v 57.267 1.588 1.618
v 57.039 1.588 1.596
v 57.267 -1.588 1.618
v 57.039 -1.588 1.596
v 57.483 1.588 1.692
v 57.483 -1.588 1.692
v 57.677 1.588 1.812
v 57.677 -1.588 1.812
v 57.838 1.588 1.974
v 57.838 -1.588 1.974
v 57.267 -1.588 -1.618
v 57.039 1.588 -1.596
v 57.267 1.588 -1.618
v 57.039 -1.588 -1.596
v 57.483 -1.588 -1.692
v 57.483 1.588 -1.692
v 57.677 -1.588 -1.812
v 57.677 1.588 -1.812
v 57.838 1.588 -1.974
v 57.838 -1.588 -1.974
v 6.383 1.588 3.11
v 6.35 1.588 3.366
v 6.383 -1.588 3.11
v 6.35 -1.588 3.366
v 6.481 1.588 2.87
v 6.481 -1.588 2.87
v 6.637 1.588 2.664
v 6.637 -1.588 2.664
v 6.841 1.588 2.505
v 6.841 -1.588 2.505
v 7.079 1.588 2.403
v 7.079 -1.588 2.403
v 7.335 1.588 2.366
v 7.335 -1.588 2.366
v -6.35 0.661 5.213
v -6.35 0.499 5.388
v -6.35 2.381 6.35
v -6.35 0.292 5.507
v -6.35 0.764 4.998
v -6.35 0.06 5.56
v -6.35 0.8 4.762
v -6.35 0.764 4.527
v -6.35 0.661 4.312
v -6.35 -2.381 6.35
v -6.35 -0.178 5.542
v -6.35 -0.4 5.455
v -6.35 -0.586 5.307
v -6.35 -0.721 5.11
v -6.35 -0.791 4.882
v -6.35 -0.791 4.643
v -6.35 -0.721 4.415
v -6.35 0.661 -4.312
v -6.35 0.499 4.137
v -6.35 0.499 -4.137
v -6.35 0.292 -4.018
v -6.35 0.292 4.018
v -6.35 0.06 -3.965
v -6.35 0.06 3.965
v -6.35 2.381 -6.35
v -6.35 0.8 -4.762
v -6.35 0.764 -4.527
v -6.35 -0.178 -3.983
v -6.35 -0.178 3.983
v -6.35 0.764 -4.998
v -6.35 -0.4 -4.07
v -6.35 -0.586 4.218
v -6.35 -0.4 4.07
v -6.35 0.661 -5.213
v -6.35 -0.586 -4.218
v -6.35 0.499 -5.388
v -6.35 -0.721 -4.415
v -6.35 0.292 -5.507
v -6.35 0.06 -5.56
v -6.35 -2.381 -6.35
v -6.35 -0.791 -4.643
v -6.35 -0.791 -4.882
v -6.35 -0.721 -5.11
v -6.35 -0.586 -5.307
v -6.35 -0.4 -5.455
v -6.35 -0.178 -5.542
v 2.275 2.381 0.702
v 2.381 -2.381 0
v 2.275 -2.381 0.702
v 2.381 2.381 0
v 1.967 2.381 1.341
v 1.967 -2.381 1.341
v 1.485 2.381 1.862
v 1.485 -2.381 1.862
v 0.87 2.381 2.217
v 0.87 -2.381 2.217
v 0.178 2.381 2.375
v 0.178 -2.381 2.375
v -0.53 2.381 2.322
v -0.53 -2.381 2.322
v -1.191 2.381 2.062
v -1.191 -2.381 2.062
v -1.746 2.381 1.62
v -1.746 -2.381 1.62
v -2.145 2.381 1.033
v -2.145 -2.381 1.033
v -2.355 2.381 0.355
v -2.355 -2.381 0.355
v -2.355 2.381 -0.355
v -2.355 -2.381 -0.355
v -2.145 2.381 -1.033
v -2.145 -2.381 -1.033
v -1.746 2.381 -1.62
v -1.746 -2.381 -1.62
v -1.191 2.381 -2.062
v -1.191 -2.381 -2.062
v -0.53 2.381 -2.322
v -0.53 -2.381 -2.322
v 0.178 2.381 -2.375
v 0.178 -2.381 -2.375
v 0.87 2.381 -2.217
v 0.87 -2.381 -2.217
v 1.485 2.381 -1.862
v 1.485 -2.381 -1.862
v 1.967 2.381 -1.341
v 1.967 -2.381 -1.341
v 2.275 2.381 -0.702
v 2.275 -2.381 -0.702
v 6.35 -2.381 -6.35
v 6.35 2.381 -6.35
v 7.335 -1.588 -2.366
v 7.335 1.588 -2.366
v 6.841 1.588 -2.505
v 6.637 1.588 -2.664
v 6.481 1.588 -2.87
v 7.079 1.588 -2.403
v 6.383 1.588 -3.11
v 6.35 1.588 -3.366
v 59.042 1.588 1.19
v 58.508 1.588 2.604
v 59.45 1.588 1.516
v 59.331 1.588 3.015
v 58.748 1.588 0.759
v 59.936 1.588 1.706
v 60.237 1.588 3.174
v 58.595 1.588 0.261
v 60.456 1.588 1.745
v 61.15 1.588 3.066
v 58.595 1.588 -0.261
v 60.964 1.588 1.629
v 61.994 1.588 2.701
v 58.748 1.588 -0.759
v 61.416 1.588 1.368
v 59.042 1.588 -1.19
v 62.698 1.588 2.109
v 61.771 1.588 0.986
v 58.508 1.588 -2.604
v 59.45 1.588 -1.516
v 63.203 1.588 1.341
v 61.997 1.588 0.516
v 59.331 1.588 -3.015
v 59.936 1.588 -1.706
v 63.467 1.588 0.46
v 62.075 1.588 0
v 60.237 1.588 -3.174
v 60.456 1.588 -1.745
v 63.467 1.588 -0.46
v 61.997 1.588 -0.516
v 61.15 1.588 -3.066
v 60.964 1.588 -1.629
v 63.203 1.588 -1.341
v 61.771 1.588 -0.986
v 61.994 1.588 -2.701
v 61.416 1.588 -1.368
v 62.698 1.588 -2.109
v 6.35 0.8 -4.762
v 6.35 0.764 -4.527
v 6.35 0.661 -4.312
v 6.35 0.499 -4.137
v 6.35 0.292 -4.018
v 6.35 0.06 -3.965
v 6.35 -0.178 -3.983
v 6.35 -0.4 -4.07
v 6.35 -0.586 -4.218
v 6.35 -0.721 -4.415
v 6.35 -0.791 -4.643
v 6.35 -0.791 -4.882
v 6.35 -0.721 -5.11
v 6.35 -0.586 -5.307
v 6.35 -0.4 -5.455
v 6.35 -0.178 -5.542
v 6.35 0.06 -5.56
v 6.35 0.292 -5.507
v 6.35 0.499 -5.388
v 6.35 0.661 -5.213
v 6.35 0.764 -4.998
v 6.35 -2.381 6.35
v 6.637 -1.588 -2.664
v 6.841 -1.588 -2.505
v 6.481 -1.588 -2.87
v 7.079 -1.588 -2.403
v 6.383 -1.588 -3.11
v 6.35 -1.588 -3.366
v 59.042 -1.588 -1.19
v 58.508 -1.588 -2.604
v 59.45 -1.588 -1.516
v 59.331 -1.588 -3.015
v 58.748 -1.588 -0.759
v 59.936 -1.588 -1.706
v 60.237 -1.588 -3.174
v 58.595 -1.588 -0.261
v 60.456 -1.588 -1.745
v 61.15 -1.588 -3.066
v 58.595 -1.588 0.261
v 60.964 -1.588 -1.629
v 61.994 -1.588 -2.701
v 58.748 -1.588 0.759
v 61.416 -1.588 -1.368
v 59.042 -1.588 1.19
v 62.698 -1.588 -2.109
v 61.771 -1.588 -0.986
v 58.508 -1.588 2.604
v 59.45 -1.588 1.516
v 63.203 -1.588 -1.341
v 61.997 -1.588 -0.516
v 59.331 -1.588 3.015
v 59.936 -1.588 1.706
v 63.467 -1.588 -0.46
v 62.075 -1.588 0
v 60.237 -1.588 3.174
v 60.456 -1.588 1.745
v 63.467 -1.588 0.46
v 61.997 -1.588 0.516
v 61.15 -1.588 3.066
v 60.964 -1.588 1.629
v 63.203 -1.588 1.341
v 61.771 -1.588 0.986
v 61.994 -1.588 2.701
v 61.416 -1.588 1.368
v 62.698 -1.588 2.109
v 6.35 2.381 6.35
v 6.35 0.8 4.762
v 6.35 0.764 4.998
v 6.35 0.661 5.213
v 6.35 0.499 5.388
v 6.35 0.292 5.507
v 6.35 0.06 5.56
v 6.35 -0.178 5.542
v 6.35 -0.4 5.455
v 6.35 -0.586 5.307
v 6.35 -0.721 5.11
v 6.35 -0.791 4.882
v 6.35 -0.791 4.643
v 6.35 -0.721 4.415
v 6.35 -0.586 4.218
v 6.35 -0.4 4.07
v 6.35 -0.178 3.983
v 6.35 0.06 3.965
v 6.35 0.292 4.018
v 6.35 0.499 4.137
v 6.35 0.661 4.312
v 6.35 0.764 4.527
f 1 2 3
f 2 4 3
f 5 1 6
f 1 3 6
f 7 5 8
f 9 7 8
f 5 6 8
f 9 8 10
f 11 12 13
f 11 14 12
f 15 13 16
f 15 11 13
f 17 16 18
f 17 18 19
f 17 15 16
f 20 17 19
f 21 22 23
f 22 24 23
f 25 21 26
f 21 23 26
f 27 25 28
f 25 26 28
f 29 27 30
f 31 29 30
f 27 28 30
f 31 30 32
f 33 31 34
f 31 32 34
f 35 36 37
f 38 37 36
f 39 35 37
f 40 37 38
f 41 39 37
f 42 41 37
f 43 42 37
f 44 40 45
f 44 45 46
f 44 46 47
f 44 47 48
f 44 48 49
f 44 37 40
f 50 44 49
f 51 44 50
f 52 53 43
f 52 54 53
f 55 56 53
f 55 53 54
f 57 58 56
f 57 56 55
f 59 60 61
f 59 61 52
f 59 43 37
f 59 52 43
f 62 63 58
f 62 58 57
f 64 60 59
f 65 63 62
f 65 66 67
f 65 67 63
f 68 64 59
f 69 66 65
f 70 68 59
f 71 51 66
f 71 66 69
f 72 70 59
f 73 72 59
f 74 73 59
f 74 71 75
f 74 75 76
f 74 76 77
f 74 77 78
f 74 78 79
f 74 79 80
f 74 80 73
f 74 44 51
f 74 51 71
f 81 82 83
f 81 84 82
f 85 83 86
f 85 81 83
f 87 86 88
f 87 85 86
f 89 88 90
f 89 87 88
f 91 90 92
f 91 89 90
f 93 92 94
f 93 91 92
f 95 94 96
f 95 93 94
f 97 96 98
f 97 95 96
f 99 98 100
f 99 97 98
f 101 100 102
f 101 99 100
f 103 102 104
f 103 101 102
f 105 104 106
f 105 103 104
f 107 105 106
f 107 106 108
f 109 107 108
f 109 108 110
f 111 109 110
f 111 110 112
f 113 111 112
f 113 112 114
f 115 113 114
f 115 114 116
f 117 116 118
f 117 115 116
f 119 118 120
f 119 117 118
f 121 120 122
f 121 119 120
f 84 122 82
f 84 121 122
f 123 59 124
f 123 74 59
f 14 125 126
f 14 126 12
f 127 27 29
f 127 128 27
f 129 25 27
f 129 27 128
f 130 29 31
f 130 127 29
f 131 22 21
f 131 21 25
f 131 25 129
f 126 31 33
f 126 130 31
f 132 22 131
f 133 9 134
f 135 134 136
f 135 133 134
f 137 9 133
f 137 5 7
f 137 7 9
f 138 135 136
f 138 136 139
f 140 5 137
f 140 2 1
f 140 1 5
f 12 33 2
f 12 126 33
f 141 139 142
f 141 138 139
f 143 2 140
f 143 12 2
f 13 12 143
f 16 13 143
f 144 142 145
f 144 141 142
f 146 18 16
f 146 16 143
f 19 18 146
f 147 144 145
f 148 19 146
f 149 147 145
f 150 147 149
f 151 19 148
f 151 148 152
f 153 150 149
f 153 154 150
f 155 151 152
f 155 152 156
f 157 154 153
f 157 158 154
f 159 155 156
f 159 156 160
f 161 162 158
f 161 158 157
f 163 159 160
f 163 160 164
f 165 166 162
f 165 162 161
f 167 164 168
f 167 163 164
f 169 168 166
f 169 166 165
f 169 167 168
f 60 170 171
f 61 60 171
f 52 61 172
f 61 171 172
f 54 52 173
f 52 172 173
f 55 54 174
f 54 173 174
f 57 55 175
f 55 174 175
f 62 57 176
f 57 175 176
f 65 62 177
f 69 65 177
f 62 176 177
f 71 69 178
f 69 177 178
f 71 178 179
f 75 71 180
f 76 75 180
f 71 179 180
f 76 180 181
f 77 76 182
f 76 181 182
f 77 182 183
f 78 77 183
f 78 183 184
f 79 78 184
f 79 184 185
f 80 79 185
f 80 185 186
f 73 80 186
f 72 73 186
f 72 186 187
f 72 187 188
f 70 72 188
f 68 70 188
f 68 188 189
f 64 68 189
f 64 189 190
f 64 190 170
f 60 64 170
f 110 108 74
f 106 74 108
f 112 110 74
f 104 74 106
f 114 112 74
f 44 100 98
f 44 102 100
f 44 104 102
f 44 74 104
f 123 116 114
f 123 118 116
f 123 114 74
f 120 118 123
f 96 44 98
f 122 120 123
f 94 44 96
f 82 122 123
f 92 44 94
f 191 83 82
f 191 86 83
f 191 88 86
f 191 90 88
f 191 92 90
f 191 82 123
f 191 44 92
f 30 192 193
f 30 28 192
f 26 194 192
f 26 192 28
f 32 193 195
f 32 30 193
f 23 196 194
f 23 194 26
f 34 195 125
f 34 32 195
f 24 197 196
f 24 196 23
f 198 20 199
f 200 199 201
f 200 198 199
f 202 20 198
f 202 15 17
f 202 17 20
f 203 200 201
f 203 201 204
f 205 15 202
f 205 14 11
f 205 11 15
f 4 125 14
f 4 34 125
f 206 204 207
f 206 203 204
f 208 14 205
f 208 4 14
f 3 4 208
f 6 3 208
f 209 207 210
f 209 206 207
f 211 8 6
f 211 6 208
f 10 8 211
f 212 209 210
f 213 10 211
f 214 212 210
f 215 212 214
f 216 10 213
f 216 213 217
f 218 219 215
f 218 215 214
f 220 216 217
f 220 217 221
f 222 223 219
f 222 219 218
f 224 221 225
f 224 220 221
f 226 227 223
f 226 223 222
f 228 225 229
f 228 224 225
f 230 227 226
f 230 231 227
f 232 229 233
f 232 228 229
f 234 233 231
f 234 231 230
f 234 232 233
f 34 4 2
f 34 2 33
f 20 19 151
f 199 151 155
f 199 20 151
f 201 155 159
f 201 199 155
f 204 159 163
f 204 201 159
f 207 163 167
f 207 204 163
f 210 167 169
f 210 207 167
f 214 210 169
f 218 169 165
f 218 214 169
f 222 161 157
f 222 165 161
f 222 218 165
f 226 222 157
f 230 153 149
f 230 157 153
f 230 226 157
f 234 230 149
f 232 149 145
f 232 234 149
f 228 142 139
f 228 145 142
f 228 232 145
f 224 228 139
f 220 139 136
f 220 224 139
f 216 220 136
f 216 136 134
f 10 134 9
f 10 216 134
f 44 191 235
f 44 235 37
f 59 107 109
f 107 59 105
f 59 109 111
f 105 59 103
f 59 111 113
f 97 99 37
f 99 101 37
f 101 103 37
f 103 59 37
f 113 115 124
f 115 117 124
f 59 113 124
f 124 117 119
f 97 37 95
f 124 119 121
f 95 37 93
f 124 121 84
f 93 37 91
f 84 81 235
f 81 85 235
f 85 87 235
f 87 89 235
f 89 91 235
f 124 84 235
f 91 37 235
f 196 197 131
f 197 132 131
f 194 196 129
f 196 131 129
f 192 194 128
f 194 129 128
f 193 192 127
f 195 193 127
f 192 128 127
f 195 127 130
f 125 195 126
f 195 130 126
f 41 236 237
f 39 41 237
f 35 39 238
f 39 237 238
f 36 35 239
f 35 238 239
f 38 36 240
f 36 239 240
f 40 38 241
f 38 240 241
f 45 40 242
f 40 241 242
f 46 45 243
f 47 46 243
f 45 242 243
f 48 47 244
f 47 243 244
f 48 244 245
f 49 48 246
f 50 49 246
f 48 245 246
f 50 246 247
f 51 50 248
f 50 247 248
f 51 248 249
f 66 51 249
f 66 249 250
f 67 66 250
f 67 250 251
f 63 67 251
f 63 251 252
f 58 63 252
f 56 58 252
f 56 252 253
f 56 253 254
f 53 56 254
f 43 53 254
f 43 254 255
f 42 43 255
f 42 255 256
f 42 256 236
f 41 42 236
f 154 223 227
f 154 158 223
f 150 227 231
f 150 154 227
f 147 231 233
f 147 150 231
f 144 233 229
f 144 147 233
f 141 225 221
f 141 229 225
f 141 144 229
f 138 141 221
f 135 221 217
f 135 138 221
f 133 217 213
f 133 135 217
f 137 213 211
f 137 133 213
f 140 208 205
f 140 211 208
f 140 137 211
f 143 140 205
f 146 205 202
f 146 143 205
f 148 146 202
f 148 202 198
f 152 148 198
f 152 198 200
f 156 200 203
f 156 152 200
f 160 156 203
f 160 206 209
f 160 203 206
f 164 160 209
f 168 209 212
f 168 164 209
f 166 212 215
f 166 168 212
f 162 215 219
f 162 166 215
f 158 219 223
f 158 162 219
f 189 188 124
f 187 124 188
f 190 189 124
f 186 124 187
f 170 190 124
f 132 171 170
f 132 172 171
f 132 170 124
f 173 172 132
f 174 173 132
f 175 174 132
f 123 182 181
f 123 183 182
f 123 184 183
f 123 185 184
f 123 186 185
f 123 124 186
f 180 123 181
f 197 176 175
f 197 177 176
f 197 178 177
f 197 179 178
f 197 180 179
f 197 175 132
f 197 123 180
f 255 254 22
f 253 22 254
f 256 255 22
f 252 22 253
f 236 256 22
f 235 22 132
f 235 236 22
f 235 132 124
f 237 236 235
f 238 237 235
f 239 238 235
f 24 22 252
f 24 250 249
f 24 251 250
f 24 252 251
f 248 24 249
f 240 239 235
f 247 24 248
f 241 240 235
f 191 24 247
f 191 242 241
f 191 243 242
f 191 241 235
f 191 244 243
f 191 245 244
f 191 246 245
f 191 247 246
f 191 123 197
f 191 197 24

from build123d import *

# Parameters (mm, degrees)
F0_R     = 2.38125
F0_R_2   = 1.75
F1_DEPTH = 2.38125
F2_W     = 57.15
F2_H     = 0.79375
F3_DEPTH = 12.5
F5_D     = 1.6
F6_R     = 1


with BuildPart() as f1:
    # F0 (on Front) → F1 (new body, symmetric)
    with BuildSketch(Plane.XZ):
        with BuildLine():
            Line((6.35, -2.38125), (57.575369343, -1.5875))
            ThreePointArc((57.575369343, -1.5875), (63.5, 0), (57.575369343, 1.5875))
            Line((57.575369343, 1.5875), (6.35, 2.38125))
            Line((6.35, 2.38125), (6.35, 6.35))
            Line((6.35, 6.35), (-6.35, 6.35))
            Line((-6.35, 6.35), (-6.35, -6.35))
            Line((-6.35, -6.35), (6.35, -6.35))
            Line((6.35, -6.35), (6.35, -2.38125))
        make_face()
        Circle(F0_R, mode=Mode.SUBTRACT)
        with Locations((60.325, 0)):
            Circle(F0_R_2, mode=Mode.SUBTRACT)
    extrude(amount=F1_DEPTH, both=True)

    # F2 (on Top) → F3 (cut, symmetric)
    with BuildSketch(Plane.XY):
        with Locations((34.925, 1.984375)):
            Rectangle(F2_W, F2_H)
        with Locations((34.925, -1.984375)):
            Rectangle(F2_W, F2_H)
    extrude(amount=F3_DEPTH, both=True, mode=Mode.SUBTRACT)

    # F5 (through all)
    with Locations(Plane(origin=(-6.35, 0, 0), x_dir=(0, -1, 0), z_dir=(-1, 0, 0))):
        with Locations((0, 4.7625), (0, -4.7625)):
            Hole(F5_D / 2)

    # F6
    f6_edges = [f1.edges().sort_by_distance(p)[0] for p in [
        (6.35, 0, 2.38125),
        (6.35, 0, -2.38125),
        (57.575369, 0, 1.5875),
        (57.575369, 0, -1.5875),
    ]]
    fillet(f6_edges, radius=F6_R)


solid = f1.part
